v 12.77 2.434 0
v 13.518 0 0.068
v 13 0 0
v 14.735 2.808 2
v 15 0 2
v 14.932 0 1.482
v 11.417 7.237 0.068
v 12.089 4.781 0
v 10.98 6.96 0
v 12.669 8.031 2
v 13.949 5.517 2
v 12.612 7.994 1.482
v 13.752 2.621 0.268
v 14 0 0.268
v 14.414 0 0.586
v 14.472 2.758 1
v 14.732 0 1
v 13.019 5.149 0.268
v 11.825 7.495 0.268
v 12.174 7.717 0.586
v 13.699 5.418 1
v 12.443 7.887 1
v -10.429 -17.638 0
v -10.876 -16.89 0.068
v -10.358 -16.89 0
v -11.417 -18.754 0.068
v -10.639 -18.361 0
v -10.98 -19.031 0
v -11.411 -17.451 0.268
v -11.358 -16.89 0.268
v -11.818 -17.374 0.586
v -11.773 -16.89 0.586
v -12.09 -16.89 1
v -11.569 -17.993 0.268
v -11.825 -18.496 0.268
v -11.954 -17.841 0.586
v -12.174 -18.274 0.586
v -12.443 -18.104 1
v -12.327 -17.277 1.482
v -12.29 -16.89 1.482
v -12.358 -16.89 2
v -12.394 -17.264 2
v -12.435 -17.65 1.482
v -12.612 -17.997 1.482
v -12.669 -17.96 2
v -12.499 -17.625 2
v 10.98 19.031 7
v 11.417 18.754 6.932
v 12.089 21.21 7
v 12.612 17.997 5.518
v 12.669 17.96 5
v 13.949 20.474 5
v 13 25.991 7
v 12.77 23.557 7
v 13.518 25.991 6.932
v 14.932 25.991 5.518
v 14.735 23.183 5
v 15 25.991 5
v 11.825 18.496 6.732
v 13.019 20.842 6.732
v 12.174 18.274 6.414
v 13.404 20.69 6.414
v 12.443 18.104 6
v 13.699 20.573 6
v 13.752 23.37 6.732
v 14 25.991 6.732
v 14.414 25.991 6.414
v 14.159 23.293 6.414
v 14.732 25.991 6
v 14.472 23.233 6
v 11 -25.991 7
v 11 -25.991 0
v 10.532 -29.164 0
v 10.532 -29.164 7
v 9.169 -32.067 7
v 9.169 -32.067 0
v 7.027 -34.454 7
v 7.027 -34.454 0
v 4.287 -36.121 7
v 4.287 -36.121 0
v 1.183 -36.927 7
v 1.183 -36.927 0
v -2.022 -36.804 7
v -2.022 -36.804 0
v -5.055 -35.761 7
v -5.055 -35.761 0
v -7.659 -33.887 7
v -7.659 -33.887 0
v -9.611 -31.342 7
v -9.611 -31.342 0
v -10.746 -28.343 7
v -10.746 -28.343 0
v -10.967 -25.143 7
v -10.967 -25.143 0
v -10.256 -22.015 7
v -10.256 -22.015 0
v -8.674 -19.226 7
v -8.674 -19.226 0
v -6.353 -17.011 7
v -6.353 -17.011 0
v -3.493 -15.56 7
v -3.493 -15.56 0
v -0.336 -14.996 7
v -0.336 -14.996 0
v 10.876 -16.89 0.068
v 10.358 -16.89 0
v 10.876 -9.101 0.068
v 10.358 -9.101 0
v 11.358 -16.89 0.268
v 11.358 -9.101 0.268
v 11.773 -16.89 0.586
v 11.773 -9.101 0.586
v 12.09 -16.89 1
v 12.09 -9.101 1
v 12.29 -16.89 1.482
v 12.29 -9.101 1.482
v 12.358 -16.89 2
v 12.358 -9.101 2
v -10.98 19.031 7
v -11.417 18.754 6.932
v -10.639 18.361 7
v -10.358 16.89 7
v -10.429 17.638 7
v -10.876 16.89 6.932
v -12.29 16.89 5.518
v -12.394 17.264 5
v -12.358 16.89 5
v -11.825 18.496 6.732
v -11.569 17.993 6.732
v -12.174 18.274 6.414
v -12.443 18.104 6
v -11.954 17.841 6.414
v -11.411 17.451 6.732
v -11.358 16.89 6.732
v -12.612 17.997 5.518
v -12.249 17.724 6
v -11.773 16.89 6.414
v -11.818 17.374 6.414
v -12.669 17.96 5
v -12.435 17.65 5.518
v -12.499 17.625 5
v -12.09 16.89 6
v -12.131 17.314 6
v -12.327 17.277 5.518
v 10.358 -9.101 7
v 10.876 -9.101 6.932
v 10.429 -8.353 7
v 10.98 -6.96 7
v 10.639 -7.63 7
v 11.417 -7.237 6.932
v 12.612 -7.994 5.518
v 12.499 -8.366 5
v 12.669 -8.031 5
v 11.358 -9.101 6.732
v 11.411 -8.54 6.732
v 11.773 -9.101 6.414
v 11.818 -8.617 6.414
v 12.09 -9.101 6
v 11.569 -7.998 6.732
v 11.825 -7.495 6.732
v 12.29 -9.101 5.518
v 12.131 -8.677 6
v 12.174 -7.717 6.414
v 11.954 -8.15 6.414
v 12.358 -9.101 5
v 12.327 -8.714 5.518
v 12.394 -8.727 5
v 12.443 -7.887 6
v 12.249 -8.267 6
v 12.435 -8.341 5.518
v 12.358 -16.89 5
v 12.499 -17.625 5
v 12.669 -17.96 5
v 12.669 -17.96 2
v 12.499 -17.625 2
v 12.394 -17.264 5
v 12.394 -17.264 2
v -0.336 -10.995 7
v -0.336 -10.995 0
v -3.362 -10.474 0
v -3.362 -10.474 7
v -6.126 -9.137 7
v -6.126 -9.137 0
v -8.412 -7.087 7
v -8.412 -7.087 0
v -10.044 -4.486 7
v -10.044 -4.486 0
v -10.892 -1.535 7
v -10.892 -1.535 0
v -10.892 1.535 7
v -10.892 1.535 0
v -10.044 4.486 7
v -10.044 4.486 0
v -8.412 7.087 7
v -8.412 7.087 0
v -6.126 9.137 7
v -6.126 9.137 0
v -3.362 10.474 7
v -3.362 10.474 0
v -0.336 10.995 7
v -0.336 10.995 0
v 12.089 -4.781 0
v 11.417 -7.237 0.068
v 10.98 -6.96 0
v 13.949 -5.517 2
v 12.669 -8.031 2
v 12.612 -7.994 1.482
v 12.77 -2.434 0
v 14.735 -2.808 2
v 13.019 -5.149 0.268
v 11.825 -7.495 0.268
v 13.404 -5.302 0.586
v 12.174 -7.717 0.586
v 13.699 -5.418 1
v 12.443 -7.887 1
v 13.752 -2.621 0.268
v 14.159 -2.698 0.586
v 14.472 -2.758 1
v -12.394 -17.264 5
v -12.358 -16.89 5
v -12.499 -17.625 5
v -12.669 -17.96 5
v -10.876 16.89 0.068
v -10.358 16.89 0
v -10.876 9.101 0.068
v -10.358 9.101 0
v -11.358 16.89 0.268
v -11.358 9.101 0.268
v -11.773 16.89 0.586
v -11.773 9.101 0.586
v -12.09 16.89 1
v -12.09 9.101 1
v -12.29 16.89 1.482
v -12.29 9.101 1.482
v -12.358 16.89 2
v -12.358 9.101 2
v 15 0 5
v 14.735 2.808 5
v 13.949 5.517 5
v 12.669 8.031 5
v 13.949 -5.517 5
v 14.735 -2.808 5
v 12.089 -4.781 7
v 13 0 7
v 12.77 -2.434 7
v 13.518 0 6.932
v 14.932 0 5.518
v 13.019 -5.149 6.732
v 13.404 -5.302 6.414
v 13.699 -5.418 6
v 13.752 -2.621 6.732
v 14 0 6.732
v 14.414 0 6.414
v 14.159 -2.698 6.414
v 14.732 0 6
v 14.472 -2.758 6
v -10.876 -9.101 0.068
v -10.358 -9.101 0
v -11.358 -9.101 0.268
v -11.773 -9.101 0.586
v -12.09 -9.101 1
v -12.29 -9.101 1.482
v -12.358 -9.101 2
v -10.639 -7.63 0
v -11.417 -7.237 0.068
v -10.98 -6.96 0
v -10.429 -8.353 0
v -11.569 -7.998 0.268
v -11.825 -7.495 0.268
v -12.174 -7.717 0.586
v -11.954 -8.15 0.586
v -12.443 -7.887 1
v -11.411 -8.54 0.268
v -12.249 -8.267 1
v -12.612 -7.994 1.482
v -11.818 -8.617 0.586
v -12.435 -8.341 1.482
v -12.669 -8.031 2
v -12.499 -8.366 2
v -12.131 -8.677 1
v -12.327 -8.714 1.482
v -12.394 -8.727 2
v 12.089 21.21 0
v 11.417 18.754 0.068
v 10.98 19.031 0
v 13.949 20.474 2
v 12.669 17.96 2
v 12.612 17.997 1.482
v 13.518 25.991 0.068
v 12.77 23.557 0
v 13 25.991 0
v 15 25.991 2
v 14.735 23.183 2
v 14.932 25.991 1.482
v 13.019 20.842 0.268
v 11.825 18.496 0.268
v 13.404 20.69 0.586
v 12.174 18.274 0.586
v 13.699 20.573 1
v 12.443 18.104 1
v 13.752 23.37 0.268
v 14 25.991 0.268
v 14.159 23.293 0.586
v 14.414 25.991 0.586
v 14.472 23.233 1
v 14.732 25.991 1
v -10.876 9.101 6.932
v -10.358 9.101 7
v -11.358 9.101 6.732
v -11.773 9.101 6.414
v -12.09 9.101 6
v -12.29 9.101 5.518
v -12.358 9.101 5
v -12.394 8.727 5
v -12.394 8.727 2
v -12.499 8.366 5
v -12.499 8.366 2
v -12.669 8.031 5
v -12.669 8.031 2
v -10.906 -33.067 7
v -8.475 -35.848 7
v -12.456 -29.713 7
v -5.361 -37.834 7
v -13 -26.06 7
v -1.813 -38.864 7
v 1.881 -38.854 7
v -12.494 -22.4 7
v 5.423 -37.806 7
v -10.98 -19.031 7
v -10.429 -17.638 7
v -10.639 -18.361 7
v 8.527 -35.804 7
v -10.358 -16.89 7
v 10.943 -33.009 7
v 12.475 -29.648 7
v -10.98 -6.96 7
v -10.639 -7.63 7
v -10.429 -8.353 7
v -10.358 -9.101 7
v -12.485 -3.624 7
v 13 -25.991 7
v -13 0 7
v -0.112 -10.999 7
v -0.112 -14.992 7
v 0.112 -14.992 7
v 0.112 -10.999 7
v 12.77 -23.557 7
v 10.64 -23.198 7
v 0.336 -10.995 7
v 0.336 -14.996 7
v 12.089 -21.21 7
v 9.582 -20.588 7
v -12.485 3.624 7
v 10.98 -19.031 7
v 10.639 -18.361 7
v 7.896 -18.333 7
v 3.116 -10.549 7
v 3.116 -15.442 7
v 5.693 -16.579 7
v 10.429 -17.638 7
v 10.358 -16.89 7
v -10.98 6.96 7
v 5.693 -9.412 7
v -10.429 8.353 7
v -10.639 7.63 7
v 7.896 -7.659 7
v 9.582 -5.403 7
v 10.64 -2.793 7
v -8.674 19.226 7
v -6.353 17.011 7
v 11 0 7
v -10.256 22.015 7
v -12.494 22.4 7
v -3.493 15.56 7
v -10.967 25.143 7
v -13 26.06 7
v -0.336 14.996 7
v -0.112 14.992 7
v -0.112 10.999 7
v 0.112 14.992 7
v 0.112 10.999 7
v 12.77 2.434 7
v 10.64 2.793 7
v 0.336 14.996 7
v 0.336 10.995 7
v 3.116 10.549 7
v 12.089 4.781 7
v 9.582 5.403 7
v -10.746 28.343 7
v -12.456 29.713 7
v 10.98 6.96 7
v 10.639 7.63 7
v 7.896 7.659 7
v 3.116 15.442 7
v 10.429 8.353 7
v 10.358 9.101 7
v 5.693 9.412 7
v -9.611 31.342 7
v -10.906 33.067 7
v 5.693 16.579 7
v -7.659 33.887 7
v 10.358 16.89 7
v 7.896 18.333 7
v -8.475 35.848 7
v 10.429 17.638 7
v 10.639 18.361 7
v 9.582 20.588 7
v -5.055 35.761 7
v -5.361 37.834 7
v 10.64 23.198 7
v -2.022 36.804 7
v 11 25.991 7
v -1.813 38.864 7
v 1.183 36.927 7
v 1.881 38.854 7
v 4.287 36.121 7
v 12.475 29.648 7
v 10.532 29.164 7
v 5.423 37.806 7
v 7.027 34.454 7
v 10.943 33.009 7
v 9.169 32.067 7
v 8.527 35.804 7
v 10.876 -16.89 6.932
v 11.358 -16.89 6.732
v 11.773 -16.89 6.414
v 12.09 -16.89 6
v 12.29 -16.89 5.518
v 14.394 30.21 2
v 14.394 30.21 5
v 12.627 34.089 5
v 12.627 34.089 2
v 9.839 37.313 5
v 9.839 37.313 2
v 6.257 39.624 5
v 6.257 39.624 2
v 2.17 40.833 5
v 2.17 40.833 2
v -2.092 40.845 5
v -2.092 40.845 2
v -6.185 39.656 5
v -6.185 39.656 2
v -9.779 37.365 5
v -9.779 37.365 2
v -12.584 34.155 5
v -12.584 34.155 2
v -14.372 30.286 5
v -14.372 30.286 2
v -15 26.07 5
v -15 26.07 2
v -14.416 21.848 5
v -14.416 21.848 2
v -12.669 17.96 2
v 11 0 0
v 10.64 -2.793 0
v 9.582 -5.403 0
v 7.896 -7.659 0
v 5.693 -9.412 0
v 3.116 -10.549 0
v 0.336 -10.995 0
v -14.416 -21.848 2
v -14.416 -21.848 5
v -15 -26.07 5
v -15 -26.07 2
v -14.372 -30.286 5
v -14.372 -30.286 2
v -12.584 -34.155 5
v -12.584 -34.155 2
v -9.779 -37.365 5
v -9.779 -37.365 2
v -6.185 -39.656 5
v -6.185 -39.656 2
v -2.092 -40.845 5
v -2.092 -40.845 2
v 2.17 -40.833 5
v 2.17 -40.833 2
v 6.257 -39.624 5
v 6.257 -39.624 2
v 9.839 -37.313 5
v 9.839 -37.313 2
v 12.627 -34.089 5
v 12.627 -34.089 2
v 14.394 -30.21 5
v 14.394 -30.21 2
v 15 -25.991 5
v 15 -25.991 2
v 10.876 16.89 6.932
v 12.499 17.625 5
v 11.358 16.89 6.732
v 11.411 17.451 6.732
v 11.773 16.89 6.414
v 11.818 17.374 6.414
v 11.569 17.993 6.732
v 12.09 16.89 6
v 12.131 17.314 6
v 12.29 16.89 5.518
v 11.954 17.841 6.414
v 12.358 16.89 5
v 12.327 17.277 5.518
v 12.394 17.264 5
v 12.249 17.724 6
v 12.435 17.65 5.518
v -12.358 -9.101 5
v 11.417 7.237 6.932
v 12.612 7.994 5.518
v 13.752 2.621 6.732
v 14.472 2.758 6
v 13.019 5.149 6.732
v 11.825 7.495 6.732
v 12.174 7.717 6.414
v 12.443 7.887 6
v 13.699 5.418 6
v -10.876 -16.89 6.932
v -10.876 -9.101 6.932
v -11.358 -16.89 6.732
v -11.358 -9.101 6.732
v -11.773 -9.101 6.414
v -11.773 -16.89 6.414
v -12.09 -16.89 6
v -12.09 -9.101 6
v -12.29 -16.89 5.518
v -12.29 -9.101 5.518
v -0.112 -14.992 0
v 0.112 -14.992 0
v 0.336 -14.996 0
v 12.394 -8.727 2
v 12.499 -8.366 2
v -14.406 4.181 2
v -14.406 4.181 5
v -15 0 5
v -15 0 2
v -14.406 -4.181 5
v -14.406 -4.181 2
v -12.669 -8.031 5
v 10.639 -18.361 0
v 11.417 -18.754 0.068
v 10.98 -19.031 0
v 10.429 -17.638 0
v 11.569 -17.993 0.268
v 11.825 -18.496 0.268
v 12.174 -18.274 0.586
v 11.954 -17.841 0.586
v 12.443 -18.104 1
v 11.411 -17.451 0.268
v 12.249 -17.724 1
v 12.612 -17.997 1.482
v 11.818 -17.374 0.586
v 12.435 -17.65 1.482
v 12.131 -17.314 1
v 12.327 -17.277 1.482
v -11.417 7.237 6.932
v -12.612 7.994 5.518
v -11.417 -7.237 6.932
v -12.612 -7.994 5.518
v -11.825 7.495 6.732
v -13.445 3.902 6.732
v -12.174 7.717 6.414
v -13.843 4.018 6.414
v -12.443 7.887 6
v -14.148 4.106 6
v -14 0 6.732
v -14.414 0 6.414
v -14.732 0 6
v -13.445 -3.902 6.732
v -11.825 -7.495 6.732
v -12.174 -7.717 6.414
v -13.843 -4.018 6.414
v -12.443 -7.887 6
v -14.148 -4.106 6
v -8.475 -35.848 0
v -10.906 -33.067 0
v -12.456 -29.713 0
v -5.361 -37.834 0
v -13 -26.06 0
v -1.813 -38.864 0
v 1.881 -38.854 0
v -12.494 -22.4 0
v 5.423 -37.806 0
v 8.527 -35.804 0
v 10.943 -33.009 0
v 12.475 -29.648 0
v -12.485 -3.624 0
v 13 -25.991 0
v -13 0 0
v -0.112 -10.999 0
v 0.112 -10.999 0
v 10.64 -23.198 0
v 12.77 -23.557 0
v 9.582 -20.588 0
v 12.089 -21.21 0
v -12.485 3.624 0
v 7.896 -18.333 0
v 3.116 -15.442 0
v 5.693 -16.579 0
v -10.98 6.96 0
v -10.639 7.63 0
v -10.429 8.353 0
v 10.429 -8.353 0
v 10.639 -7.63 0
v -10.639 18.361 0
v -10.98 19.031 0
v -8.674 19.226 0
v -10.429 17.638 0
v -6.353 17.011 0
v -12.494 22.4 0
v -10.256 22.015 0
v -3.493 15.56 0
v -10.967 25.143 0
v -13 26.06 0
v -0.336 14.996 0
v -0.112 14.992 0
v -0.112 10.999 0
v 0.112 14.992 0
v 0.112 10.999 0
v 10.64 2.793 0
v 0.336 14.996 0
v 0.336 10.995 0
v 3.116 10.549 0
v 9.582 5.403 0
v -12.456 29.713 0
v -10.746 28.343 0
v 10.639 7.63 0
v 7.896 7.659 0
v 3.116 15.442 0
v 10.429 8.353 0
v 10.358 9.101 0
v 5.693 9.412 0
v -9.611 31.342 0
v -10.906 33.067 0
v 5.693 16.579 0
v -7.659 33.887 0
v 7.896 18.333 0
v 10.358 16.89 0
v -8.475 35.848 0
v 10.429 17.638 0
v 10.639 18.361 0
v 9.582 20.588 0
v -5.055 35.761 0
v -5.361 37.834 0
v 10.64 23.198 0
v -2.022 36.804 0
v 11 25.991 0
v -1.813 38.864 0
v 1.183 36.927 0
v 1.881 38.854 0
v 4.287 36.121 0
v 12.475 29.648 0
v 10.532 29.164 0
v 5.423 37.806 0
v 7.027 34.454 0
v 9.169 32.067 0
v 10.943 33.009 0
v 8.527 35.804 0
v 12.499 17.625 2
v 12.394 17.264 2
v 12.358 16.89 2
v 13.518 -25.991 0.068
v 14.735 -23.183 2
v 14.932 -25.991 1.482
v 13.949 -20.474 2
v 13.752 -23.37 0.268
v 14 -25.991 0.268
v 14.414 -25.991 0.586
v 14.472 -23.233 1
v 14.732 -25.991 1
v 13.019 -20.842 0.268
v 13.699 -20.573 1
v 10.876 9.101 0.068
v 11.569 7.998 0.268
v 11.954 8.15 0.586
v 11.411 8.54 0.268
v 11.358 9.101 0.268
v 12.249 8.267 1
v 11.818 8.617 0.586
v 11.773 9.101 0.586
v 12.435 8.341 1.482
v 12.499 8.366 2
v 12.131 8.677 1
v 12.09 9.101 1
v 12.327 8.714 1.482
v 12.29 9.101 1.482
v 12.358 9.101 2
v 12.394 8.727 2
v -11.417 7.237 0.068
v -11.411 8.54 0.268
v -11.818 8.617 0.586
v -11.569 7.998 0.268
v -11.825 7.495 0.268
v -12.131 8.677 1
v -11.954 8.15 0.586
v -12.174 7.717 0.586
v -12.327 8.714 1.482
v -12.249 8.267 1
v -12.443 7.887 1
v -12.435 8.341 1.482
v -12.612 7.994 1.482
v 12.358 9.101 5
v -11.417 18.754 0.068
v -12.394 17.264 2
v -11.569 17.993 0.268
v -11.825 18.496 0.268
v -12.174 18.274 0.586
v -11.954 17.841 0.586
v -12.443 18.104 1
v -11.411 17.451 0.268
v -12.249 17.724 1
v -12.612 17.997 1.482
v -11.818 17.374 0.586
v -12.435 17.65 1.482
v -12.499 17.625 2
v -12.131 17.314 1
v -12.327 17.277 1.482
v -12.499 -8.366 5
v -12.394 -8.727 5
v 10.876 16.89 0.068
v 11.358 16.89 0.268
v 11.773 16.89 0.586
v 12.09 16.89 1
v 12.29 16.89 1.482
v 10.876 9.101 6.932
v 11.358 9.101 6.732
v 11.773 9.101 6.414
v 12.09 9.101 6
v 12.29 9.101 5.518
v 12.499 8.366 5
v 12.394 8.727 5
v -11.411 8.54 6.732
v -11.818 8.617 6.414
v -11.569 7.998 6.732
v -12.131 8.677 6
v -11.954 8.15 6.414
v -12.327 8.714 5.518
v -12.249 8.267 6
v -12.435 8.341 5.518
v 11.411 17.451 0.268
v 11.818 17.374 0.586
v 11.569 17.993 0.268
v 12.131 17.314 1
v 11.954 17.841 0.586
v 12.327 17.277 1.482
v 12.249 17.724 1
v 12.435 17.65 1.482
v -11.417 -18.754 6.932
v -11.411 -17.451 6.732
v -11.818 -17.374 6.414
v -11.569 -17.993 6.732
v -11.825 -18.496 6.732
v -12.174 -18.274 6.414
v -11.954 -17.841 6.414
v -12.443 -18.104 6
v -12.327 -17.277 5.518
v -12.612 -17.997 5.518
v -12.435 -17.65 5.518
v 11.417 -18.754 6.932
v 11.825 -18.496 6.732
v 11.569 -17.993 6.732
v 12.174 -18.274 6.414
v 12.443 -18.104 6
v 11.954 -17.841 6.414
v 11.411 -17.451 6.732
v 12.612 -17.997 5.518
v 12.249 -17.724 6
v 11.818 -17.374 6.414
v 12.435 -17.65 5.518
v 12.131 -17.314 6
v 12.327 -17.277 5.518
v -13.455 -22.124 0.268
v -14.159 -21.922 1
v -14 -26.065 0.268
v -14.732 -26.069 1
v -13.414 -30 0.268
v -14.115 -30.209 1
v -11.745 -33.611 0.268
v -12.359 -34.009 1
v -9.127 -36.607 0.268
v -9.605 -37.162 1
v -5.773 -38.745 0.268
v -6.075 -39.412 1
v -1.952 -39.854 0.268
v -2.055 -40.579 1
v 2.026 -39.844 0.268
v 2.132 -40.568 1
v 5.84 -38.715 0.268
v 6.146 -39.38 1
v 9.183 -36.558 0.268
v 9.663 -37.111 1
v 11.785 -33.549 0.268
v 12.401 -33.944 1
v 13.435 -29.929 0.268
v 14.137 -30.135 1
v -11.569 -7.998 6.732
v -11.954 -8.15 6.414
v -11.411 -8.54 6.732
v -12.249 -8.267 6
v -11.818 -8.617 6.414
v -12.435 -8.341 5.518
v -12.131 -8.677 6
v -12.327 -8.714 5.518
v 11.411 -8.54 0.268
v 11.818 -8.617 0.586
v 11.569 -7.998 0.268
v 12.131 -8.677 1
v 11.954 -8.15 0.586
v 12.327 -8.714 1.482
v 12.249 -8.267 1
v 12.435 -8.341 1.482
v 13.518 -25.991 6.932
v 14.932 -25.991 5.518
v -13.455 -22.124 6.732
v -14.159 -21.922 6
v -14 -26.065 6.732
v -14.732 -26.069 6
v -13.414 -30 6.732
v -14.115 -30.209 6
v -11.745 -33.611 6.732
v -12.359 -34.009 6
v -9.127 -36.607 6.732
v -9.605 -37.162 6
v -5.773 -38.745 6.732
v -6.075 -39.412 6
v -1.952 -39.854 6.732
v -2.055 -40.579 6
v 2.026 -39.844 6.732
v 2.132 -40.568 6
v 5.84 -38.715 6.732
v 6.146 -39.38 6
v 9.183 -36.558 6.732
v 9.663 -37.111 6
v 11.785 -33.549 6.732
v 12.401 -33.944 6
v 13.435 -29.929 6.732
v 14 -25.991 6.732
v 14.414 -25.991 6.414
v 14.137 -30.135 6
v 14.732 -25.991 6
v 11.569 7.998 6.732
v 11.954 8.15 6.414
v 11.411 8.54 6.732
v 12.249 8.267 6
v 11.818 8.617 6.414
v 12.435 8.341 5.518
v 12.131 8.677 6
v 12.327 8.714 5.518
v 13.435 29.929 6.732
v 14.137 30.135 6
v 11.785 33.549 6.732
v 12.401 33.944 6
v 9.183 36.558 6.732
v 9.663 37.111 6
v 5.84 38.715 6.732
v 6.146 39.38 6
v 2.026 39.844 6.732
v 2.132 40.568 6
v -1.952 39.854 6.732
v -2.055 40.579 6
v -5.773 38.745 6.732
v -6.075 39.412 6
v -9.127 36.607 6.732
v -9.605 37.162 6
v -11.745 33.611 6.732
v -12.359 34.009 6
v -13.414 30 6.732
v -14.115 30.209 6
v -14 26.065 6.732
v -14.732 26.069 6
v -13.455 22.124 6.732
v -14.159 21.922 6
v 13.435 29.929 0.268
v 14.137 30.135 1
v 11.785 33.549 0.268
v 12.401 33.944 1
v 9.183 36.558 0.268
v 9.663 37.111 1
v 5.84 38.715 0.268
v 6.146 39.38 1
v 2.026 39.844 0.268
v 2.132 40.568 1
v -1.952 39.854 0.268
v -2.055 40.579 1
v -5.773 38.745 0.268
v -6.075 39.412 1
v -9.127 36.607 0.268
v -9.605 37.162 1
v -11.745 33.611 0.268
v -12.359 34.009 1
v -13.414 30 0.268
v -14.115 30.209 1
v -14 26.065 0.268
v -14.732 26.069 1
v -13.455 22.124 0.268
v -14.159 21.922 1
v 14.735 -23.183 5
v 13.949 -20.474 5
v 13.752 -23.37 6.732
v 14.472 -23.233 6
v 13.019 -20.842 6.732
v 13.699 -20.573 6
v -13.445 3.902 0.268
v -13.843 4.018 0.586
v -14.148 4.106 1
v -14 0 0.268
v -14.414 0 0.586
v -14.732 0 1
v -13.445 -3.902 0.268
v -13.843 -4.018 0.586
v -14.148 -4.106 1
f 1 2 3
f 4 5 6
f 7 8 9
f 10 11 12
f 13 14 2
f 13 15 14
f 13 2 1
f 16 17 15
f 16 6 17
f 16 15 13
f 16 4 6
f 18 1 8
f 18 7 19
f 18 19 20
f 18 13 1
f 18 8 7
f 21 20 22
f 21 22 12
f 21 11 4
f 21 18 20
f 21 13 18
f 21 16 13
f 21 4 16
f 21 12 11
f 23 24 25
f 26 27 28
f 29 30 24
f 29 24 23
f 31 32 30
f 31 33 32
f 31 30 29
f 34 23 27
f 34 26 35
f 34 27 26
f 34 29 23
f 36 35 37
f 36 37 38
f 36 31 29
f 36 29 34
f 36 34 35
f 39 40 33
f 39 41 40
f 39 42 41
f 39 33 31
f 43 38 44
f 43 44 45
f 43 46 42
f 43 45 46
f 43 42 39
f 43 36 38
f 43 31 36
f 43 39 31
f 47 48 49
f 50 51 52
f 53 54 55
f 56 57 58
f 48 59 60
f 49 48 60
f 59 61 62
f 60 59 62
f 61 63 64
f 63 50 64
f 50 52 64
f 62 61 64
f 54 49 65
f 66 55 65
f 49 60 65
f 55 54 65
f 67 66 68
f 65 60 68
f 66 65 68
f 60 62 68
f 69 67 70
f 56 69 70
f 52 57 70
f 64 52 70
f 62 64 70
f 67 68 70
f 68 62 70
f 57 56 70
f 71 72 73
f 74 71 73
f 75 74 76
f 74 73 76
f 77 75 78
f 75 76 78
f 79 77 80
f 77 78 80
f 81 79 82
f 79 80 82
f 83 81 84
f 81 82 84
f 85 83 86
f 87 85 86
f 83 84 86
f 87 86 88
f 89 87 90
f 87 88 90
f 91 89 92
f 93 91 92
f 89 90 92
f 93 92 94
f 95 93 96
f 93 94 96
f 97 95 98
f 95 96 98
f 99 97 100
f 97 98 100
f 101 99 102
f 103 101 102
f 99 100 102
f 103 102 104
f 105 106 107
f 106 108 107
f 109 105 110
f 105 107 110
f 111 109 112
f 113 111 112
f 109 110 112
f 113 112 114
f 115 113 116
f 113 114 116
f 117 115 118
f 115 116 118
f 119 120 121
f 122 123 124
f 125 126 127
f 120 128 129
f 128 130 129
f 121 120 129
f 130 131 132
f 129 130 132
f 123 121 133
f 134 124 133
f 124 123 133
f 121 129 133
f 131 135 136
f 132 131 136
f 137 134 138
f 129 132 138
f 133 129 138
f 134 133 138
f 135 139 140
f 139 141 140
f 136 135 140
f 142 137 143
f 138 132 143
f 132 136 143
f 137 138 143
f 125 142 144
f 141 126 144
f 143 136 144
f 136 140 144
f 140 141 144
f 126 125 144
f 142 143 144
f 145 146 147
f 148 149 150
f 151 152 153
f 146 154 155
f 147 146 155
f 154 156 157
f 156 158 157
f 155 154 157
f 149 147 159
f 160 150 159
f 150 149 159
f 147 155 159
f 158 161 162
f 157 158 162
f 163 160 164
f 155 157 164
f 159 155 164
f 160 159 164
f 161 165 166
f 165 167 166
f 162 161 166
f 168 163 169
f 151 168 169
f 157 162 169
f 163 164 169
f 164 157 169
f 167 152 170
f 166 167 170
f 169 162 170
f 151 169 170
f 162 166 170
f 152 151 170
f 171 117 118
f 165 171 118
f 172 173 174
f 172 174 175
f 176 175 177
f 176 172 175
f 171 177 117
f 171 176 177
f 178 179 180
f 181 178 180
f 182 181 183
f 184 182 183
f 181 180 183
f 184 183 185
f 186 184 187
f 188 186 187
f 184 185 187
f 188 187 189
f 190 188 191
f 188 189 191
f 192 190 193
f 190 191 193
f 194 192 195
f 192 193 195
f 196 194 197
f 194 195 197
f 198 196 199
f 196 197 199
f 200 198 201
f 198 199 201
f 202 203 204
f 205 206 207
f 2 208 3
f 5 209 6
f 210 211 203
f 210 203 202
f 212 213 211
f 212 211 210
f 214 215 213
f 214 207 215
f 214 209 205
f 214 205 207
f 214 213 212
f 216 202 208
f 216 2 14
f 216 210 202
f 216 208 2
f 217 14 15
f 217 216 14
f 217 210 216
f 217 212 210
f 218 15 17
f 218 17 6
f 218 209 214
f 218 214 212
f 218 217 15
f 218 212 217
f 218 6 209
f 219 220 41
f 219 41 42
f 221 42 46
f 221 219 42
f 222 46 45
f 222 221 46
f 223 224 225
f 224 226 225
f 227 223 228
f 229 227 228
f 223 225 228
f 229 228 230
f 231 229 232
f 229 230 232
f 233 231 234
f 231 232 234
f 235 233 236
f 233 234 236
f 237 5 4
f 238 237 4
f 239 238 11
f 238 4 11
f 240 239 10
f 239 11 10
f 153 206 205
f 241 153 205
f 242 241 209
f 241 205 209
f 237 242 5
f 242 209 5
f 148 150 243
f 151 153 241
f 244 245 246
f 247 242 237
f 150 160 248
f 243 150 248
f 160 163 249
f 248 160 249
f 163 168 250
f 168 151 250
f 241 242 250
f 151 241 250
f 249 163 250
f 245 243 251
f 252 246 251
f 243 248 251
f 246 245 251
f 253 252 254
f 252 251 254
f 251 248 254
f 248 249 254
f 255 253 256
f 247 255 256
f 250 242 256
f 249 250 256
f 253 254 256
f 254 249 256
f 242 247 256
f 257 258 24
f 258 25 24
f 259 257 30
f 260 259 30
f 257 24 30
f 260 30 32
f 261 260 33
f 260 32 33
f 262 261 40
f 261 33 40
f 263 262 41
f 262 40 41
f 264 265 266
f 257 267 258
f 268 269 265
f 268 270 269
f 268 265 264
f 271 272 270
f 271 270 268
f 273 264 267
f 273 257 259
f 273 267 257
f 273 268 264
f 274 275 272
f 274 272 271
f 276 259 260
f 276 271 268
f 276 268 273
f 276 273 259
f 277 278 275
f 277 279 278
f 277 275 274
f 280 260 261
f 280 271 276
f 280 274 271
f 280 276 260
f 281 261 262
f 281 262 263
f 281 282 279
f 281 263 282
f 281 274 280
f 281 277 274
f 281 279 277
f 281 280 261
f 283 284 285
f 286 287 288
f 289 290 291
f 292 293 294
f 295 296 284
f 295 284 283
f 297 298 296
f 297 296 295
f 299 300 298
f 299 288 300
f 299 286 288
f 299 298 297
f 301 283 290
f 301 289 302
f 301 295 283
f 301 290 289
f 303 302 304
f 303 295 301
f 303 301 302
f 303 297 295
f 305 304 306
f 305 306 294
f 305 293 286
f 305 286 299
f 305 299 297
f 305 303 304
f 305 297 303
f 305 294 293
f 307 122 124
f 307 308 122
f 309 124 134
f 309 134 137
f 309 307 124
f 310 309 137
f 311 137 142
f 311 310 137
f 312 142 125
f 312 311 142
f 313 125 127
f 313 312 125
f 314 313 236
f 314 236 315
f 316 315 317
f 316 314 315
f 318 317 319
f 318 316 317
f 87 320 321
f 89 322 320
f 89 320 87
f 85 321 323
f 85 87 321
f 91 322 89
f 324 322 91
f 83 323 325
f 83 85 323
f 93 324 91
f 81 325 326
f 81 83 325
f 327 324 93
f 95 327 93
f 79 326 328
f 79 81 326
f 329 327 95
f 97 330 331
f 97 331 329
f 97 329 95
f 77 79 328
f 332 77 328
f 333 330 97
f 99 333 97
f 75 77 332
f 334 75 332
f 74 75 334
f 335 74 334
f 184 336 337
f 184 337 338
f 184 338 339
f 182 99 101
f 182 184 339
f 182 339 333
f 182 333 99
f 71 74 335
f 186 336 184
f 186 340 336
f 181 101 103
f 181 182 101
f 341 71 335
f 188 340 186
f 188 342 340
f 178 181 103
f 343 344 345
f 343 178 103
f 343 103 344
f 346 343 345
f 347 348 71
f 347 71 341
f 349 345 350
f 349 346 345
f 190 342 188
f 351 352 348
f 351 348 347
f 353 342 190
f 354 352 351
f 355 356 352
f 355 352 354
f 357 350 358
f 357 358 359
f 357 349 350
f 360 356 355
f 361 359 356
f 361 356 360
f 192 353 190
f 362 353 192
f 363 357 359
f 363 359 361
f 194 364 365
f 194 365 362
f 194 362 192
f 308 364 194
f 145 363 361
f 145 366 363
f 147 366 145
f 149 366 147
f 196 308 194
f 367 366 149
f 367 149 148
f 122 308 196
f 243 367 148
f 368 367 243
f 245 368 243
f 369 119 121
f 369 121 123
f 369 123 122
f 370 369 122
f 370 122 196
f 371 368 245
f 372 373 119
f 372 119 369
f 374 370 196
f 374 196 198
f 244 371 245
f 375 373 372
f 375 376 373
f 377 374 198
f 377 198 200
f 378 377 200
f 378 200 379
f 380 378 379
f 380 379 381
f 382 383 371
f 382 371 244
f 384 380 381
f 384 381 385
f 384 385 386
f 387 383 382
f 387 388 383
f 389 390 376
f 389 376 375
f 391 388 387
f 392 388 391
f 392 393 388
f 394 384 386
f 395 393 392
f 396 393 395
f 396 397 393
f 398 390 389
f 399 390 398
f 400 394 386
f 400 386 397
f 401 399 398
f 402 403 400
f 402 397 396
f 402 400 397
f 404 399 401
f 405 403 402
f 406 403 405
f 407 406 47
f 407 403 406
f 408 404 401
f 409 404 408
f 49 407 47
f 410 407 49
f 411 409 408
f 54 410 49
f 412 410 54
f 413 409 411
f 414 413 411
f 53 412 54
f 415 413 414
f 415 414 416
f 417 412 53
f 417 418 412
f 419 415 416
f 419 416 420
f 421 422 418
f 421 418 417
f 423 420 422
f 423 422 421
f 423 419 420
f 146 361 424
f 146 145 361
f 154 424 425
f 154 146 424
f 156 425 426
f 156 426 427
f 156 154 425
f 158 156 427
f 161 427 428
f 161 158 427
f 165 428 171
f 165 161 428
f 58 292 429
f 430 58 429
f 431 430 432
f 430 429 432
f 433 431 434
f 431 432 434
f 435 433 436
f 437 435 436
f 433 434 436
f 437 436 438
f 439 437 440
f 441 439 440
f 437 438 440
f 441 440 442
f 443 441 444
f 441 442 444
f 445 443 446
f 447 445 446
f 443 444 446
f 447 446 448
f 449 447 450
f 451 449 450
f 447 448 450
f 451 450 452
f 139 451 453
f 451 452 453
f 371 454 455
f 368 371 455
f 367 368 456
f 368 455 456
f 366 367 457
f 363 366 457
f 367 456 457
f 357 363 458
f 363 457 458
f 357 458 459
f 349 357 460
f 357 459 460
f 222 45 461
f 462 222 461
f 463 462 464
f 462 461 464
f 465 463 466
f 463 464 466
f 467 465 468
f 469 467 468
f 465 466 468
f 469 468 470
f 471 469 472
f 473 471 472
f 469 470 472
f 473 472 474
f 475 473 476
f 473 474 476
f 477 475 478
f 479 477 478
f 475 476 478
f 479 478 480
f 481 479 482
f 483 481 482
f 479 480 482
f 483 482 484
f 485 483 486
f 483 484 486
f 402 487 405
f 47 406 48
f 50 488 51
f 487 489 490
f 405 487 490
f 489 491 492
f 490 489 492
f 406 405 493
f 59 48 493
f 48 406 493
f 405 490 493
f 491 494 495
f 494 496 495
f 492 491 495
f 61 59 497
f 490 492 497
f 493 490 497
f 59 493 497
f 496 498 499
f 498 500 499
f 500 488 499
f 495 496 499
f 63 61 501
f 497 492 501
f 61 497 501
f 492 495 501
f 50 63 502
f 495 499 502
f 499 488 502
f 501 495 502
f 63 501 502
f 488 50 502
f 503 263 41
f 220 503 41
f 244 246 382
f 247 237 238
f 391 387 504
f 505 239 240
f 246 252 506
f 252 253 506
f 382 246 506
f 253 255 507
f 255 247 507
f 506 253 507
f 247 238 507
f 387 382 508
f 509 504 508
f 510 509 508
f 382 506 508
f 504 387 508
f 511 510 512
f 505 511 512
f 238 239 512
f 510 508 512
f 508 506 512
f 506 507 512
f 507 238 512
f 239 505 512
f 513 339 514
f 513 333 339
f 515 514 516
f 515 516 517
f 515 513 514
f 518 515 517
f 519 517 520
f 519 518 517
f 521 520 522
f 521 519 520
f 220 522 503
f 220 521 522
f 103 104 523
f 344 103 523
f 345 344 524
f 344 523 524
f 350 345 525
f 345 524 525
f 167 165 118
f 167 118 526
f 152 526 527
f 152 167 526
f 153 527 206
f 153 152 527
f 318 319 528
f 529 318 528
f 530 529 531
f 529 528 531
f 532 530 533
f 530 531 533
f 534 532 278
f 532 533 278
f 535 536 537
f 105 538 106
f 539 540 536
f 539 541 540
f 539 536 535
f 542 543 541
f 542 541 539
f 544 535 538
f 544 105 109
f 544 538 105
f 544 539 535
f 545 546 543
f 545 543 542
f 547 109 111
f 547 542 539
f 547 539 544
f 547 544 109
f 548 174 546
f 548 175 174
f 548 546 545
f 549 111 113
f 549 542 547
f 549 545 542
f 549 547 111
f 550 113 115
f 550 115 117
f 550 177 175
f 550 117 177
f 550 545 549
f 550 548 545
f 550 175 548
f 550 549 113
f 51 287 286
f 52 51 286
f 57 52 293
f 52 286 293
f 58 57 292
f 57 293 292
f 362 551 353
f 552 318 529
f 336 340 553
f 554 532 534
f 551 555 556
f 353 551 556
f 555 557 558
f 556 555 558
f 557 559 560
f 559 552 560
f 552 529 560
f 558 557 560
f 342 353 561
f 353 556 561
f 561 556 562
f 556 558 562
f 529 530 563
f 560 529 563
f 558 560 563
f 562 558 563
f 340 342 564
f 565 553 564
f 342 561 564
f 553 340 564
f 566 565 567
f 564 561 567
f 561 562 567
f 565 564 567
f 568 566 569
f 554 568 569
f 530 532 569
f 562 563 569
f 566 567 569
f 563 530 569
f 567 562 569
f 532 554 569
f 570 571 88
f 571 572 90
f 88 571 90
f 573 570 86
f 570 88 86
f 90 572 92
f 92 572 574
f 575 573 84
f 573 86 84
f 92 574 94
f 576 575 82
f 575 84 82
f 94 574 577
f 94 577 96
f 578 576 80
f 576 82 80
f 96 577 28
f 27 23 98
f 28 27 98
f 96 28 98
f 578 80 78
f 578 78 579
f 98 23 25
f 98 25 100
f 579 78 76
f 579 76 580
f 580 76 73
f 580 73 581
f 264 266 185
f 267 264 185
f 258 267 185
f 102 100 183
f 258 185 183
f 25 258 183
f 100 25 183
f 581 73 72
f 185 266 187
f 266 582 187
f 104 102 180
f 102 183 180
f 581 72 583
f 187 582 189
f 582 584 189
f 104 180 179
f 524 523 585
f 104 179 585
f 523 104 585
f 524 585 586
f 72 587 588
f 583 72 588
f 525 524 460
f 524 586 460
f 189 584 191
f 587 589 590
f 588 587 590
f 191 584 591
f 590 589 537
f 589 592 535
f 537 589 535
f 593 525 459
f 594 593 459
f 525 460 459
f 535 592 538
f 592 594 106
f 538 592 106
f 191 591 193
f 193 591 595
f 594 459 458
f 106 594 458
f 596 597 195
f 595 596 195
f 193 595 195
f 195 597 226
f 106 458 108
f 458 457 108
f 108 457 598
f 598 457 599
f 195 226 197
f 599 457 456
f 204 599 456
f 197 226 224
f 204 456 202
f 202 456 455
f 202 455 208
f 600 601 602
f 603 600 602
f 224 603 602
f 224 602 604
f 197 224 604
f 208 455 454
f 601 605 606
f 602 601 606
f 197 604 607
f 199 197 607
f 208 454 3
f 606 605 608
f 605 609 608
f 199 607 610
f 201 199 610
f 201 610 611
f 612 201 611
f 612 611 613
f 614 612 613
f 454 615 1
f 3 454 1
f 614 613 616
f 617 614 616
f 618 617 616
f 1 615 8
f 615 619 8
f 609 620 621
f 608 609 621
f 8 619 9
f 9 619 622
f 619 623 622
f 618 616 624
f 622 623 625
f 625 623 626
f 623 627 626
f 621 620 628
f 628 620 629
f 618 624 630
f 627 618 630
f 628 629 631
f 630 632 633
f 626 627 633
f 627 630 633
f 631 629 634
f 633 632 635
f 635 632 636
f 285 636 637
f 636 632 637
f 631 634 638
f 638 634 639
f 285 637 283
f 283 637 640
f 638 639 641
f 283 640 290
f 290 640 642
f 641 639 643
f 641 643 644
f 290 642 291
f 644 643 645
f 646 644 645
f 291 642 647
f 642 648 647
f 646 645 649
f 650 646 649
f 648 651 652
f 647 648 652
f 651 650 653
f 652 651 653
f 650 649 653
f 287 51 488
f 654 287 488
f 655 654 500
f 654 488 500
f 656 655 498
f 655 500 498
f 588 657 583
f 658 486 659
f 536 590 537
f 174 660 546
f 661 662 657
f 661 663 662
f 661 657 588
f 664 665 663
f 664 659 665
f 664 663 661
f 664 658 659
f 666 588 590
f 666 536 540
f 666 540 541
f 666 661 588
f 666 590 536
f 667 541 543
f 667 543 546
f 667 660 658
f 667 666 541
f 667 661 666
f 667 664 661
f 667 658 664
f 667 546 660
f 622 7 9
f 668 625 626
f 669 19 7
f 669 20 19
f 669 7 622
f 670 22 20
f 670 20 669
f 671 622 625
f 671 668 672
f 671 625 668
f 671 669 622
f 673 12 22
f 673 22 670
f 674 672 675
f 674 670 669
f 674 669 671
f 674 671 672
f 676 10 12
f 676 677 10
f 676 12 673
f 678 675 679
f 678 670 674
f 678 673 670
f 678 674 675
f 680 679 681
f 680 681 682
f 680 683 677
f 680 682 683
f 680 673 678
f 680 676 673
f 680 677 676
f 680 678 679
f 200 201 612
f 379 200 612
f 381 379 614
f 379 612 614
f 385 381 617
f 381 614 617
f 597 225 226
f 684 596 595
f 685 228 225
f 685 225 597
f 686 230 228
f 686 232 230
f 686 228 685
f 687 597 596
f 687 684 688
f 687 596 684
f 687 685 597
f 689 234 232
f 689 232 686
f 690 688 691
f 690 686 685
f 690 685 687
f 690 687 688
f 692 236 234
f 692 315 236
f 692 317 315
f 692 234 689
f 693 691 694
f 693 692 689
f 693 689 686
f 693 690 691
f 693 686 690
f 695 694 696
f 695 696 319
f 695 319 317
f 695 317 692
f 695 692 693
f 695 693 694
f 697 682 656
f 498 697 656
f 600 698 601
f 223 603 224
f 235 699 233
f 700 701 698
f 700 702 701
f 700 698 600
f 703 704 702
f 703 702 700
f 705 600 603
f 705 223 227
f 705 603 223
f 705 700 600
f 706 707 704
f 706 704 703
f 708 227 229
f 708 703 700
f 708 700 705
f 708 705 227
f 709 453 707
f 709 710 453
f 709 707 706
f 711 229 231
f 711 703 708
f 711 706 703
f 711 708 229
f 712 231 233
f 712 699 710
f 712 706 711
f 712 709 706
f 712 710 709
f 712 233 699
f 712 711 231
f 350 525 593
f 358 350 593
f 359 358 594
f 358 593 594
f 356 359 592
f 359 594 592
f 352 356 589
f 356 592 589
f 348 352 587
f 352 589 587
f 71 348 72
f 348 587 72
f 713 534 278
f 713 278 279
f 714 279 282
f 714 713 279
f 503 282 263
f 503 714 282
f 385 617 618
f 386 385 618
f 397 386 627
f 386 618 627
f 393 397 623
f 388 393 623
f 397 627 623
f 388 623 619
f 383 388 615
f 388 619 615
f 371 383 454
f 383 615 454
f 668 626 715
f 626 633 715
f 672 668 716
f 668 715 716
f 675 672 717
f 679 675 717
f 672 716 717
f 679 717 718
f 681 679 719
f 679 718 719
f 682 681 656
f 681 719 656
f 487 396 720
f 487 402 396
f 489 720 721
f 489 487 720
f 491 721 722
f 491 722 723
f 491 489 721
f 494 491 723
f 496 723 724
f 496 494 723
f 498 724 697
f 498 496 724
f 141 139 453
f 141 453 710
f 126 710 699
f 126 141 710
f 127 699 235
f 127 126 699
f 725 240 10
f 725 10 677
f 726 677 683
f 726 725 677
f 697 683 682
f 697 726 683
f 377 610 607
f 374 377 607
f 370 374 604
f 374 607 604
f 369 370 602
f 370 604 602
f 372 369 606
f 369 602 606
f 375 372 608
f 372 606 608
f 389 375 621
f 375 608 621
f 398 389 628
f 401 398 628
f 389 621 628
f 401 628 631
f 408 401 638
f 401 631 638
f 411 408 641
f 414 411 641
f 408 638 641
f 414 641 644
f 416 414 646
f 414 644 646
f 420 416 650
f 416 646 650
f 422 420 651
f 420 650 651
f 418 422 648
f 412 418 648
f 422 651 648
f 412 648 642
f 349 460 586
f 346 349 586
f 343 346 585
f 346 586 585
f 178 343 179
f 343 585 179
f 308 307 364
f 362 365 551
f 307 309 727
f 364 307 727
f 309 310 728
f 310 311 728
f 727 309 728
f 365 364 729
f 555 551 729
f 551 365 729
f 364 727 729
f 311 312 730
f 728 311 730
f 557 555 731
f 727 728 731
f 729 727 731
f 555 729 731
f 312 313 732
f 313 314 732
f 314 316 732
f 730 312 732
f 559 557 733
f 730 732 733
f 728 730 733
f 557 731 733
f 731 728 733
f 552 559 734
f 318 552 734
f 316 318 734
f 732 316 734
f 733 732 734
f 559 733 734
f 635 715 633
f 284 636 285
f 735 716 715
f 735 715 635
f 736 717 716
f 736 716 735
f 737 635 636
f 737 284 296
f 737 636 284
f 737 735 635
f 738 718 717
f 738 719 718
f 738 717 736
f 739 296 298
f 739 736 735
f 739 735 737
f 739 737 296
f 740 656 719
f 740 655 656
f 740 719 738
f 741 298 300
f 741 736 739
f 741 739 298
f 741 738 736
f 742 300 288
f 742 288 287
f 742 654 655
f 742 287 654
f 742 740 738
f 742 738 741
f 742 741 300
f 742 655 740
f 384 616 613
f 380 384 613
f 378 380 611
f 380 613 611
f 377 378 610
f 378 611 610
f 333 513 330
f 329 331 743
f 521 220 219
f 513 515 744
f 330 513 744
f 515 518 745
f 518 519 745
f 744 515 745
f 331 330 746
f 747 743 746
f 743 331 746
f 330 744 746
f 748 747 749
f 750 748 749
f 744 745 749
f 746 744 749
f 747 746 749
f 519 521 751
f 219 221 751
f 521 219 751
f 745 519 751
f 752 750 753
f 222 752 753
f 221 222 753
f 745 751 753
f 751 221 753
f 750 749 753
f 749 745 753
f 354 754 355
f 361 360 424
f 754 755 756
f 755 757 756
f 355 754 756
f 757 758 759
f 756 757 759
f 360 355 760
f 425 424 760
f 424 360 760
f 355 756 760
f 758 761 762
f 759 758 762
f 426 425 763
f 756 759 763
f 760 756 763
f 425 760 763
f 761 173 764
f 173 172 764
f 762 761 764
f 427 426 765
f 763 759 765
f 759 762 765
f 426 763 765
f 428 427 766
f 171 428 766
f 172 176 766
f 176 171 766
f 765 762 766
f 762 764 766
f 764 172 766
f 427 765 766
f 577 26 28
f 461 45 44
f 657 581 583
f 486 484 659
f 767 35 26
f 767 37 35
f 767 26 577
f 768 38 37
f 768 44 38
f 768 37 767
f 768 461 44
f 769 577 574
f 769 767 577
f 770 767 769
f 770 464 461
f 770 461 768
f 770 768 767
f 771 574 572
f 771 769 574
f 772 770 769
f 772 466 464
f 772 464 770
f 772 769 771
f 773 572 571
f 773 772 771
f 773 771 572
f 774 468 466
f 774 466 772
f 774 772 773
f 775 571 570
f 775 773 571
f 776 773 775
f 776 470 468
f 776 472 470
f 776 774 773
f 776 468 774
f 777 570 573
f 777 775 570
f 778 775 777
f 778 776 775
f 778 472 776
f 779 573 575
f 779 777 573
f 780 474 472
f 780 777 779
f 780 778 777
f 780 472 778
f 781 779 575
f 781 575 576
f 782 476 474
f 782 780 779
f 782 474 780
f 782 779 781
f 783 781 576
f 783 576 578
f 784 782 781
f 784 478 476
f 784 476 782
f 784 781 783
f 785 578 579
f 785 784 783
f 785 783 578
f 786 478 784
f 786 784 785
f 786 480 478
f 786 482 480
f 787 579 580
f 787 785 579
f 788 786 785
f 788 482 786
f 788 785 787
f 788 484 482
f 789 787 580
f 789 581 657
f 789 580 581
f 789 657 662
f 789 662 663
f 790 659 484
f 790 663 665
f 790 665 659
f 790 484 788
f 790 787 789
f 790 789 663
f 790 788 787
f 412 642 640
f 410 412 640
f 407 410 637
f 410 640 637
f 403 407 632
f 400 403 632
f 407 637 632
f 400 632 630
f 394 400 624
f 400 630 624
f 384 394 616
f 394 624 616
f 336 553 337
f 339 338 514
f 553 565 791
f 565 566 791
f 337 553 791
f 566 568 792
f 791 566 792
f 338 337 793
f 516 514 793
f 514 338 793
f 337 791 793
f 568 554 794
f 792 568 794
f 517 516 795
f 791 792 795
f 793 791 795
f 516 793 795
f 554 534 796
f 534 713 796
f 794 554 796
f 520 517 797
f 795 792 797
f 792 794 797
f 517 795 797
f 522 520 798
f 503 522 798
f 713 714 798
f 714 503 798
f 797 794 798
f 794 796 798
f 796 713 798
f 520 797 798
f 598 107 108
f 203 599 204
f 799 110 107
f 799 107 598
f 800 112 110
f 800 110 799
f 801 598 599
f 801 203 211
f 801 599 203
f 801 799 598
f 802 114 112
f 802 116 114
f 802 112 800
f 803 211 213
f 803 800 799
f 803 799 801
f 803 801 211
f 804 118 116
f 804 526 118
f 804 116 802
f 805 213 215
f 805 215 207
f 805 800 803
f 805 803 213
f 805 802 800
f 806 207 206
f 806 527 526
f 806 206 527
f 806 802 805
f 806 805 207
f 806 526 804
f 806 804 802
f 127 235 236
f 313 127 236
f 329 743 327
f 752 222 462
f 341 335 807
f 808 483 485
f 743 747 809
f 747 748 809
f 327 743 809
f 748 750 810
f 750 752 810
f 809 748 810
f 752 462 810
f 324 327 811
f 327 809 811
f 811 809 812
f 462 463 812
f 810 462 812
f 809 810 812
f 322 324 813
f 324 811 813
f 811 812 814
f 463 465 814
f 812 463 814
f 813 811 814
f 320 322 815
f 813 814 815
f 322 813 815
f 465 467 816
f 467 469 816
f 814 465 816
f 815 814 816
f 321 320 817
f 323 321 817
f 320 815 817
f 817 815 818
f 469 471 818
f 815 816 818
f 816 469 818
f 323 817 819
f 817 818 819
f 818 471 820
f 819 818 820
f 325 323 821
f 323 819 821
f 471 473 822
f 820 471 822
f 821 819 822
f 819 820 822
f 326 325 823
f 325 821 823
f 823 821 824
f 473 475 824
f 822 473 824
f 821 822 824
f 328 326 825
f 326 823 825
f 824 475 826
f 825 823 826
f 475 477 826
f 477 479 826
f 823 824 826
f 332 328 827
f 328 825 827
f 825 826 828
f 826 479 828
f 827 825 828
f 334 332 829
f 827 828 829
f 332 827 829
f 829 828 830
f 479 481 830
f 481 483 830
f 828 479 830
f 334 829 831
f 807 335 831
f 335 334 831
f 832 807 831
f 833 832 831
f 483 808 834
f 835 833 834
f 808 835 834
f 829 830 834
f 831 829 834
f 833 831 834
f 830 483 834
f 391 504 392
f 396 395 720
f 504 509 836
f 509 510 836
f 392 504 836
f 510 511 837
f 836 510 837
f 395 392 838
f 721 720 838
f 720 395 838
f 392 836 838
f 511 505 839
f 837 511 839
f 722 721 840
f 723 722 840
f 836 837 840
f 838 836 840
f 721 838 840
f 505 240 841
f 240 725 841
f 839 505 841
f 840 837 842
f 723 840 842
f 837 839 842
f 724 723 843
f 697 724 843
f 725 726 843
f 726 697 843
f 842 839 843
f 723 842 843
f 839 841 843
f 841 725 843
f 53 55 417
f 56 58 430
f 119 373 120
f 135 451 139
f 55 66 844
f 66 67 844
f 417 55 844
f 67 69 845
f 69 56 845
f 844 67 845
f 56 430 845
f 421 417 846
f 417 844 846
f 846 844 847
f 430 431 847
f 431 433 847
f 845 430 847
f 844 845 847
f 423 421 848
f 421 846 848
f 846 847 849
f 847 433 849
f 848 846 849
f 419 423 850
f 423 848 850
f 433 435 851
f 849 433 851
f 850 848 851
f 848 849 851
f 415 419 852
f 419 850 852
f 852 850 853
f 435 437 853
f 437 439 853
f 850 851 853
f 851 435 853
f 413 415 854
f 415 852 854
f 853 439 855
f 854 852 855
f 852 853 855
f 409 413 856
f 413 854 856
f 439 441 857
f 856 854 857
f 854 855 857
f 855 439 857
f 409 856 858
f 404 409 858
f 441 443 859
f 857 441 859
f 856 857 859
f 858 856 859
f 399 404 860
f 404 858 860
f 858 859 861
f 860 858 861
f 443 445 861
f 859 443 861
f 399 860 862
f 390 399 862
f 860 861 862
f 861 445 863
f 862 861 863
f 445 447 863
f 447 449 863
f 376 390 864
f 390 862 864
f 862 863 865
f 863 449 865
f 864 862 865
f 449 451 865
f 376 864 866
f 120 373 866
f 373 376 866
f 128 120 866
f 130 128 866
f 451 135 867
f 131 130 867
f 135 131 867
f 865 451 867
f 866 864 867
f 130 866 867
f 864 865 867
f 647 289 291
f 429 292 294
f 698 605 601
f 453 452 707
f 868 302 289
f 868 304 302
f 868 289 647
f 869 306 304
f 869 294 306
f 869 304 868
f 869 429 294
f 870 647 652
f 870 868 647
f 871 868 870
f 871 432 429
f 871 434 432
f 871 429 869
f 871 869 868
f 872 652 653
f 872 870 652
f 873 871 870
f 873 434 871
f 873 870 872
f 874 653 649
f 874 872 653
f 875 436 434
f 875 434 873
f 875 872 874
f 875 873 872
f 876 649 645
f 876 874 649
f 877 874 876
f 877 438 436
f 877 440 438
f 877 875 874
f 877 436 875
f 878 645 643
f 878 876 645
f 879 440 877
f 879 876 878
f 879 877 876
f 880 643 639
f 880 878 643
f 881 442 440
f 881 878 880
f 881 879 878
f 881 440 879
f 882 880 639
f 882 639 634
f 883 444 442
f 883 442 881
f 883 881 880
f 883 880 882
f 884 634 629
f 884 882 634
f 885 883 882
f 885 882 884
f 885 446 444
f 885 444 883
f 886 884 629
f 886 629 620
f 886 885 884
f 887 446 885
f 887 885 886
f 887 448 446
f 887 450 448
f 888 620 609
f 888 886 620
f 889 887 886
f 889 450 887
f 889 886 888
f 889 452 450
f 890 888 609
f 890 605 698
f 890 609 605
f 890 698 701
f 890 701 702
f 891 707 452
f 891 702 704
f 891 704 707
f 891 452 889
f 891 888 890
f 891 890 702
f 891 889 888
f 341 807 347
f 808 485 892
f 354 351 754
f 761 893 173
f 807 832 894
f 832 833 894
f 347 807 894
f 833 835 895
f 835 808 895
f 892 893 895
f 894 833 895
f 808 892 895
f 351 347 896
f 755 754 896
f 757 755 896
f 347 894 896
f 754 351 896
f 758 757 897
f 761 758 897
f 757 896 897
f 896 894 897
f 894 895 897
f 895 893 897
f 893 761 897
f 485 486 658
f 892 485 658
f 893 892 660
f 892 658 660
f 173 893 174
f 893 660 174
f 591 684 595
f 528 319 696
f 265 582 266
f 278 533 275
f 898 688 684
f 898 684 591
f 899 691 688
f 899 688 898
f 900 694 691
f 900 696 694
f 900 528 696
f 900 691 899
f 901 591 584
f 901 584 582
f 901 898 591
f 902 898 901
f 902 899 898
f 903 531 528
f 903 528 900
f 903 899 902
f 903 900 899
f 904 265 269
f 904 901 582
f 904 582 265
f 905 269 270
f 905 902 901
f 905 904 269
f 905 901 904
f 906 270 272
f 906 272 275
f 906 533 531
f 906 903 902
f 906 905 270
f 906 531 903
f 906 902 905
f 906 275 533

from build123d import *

# Parameters (mm, degrees)
F1_DEPTH = 7
F2_F1_R  = 2
F2_F2_R  = 2


with BuildPart() as f1:
    # F0 (on Top) → F1 (new body)
    with BuildSketch(Plane.XY):
        with BuildLine():
            ThreePointArc((0.3357339129, 14.9962422873), (4.0392104898, 14.4459260215), (7.4910247439, 12.9955587909))
            ThreePointArc((7.4910247439, 12.9955587909), (10.1759290258, 14.9706607644), (12.3583803583, 17.4899156126))
            ThreePointArc((12.3583803583, 17.4899156126), (14.3243796615, 21.540033746), (15, 25.9911175817))
            ThreePointArc((15, 25.9911175817), (-4.4510838357, 40.3154972432), (-12.3583803583, 17.4899156126))
            ThreePointArc((-12.3583803583, 17.4899156126), (-10.1759290258, 14.9706607644), (-7.4910247439, 12.9955587909))
            ThreePointArc((-7.4910247439, 12.9955587909), (-4.0392104898, 14.4459260215), (-0.3357339129, 14.9962422873))
            ThreePointArc((-0.3357339129, 14.9962422873), (-7.6585549211, 33.8870998842), (11, 25.9911175817))
            ThreePointArc((11, 25.9911175817), (7.8959823025, 18.3325626607), (0.3357339129, 14.9962422873))
        make_face()
        with BuildLine():
            ThreePointArc((-0.3357339129, 10.9948752944), (0, 11), (0.3357339129, 10.9948752944))
            ThreePointArc((0.3357339129, 10.9948752944), (4.0392104898, 11.5451915602), (7.4910247439, 12.9955587909))
            ThreePointArc((7.4910247439, 12.9955587909), (4.0392104898, 14.4459260215), (0.3357339129, 14.9962422873))
            ThreePointArc((0.3357339129, 14.9962422873), (0, 14.9911175817), (-0.3357339129, 14.9962422873))
            ThreePointArc((-0.3357339129, 14.9962422873), (-4.0392104898, 14.4459260215), (-7.4910247439, 12.9955587909))
            ThreePointArc((-7.4910247439, 12.9955587909), (-4.0392104898, 11.5451915602), (-0.3357339129, 10.9948752944))
        make_face()
        with BuildLine():
            ThreePointArc((12.3583803583, 17.4899156126), (10.1759290258, 14.9706607644), (7.4910247439, 12.9955587909))
            ThreePointArc((7.4910247439, 12.9955587909), (10.1759290258, 11.0204568173), (12.3583803583, 8.5012019691))
            Line((12.3583803583, 8.5012019691), (12.3583803583, 17.4899156126))
        make_face()
        with BuildLine():
            ThreePointArc((-12.3583803583, 8.5012019691), (-10.1759290258, 11.0204568173), (-7.4910247439, 12.9955587909))
            ThreePointArc((-7.4910247439, 12.9955587909), (-10.1759290258, 14.9706607644), (-12.3583803583, 17.4899156126))
            Line((-12.3583803583, 17.4899156126), (-12.3583803583, 8.5012019691))
        make_face()
        with BuildLine():
            ThreePointArc((-0.3357339129, -10.9948752944), (-11, 0), (-0.3357339129, 10.9948752944))
            ThreePointArc((-0.3357339129, 10.9948752944), (-4.0392104898, 11.5451915602), (-7.4910247439, 12.9955587909))
            ThreePointArc((-7.4910247439, 12.9955587909), (-10.1759290258, 11.0204568173), (-12.3583803583, 8.5012019691))
            ThreePointArc((-12.3583803583, 8.5012019691), (-15, 0), (-12.3583803583, -8.5012019691))
            ThreePointArc((-12.3583803583, -8.5012019691), (-10.1759290258, -11.0204568173), (-7.4910247439, -12.9955587909))
            ThreePointArc((-7.4910247439, -12.9955587909), (-4.0392104898, -11.5451915602), (-0.3357339129, -10.9948752944))
        make_face()
        with BuildLine():
            ThreePointArc((12.3583803583, -8.5012019691), (10.1759290258, -11.0204568173), (7.4910247439, -12.9955587909))
            ThreePointArc((7.4910247439, -12.9955587909), (10.1759290258, -14.9706607644), (12.3583803583, -17.4899156126))
            Line((12.3583803583, -17.4899156126), (12.3583803583, -8.5012019691))
        make_face()
        with BuildLine():
            ThreePointArc((-12.3583803583, -17.4899156126), (-10.1759290258, -14.9706607644), (-7.4910247439, -12.9955587909))
            ThreePointArc((-7.4910247439, -12.9955587909), (-10.1759290258, -11.0204568173), (-12.3583803583, -8.5012019691))
            Line((-12.3583803583, -8.5012019691), (-12.3583803583, -17.4899156126))
        make_face()
        with BuildLine():
            ThreePointArc((7.4910247439, -12.9955587909), (4.0392104898, -11.5451915602), (0.3357339129, -10.9948752944))
            ThreePointArc((0.3357339129, -10.9948752944), (0, -11), (-0.3357339129, -10.9948752944))
            ThreePointArc((-0.3357339129, -10.9948752944), (-4.0392104898, -11.5451915602), (-7.4910247439, -12.9955587909))
            ThreePointArc((-7.4910247439, -12.9955587909), (-4.0392104898, -14.4459260215), (-0.3357339129, -14.9962422873))
            ThreePointArc((-0.3357339129, -14.9962422873), (0, -14.9911175817), (0.3357339129, -14.9962422873))
            ThreePointArc((0.3357339129, -14.9962422873), (4.0392104898, -14.4459260215), (7.4910247439, -12.9955587909))
        make_face()
        with BuildLine():
            ThreePointArc((12.3583803583, -17.4899156126), (10.1759290258, -14.9706607644), (7.4910247439, -12.9955587909))
            ThreePointArc((7.4910247439, -12.9955587909), (4.0392104898, -14.4459260215), (0.3357339129, -14.9962422873))
            ThreePointArc((0.3357339129, -14.9962422873), (7.8959823025, -18.3325626607), (11, -25.9911175817))
            ThreePointArc((11, -25.9911175817), (-7.6585549211, -33.8870998842), (-0.3357339129, -14.9962422873))
            ThreePointArc((-0.3357339129, -14.9962422873), (-4.0392104898, -14.4459260215), (-7.4910247439, -12.9955587909))
            ThreePointArc((-7.4910247439, -12.9955587909), (-10.1759290258, -14.9706607644), (-12.3583803583, -17.4899156126))
            ThreePointArc((-12.3583803583, -17.4899156126), (-4.4510838357, -40.3154972432), (15, -25.9911175817))
            ThreePointArc((15, -25.9911175817), (14.3243796615, -21.540033746), (12.3583803583, -17.4899156126))
        make_face()
        with BuildLine():
            ThreePointArc((0.3357339129, 10.9948752944), (7.8959823025, 7.6585549211), (11, 0))
            ThreePointArc((11, 0), (7.8959823025, -7.6585549211), (0.3357339129, -10.9948752944))
            ThreePointArc((0.3357339129, -10.9948752944), (4.0392104898, -11.5451915602), (7.4910247439, -12.9955587909))
            ThreePointArc((7.4910247439, -12.9955587909), (10.1759290258, -11.0204568173), (12.3583803583, -8.5012019691))
            ThreePointArc((12.3583803583, -8.5012019691), (14.3243796615, -4.4510838357), (15, 0))
            ThreePointArc((15, 0), (14.3243796615, 4.4510838357), (12.3583803583, 8.5012019691))
            ThreePointArc((12.3583803583, 8.5012019691), (10.1759290258, 11.0204568173), (7.4910247439, 12.9955587909))
            ThreePointArc((7.4910247439, 12.9955587909), (4.0392104898, 11.5451915602), (0.3357339129, 10.9948752944))
        make_face()
    extrude(amount=F1_DEPTH)

    # F2: fillet of radius 2 on 16 edges, made by hand

    # F2_f1
    f2_f1_edges = [f1.edges().sort_by_distance(p)[0] for p in [
        (-12.3583803583, -17.4899156126, 3.5),
        (12.3583803583, -17.4899156126, 3.5),
        (12.3583803583, -8.5012019691, 3.5),
        (12.3583803583, 8.5012019691, 3.5),
        (12.3583803583, 17.4899156126, 3.5),
        (-12.3583803583, 17.4899156126, 3.5),
        (-12.3583803583, 8.5012019691, 3.5),
        (-12.3583803583, -8.5012019691, 3.5),
    ]]
    fillet(f2_f1_edges, radius=F2_F1_R)

    # F2_f2
    f2_f2_edges = [f1.edges().sort_by_distance(p)[0] for p in [
        (0, -40.9911175817, 0),
        (0, -40.9911175817, 7),
        (15, 0, 0),
        (15, 0, 7),
        (0, 40.9911175817, 0),
        (0, 40.9911175817, 7),
        (-15, 0, 0),
        (-15, 0, 7),
        (-12.4376458065, 8.5440032789, 7),
        (-12.4376458065, -8.5440032789, 7),
        (-12.4376458065, 8.5440032789, 0),
        (-12.4376458065, -8.5440032789, 0),
        (12.4376458065, 17.4471143028, 7),
        (-12.4376458065, 17.4471143028, 7),
        (12.4376458065, 17.4471143028, 0),
        (-12.4376458065, 17.4471143028, 0),
        (12.4376458065, -8.5440032789, 7),
        (12.4376458065, 8.5440032789, 7),
        (12.4376458065, -8.5440032789, 0),
        (12.4376458065, 8.5440032789, 0),
        (-12.4376458065, -17.4471143028, 7),
        (12.4376458065, -17.4471143028, 7),
        (-12.4376458065, -17.4471143028, 0),
        (12.4376458065, -17.4471143028, 0),
    ]]
    fillet(f2_f2_edges, radius=F2_F2_R)


solid = f1.part
